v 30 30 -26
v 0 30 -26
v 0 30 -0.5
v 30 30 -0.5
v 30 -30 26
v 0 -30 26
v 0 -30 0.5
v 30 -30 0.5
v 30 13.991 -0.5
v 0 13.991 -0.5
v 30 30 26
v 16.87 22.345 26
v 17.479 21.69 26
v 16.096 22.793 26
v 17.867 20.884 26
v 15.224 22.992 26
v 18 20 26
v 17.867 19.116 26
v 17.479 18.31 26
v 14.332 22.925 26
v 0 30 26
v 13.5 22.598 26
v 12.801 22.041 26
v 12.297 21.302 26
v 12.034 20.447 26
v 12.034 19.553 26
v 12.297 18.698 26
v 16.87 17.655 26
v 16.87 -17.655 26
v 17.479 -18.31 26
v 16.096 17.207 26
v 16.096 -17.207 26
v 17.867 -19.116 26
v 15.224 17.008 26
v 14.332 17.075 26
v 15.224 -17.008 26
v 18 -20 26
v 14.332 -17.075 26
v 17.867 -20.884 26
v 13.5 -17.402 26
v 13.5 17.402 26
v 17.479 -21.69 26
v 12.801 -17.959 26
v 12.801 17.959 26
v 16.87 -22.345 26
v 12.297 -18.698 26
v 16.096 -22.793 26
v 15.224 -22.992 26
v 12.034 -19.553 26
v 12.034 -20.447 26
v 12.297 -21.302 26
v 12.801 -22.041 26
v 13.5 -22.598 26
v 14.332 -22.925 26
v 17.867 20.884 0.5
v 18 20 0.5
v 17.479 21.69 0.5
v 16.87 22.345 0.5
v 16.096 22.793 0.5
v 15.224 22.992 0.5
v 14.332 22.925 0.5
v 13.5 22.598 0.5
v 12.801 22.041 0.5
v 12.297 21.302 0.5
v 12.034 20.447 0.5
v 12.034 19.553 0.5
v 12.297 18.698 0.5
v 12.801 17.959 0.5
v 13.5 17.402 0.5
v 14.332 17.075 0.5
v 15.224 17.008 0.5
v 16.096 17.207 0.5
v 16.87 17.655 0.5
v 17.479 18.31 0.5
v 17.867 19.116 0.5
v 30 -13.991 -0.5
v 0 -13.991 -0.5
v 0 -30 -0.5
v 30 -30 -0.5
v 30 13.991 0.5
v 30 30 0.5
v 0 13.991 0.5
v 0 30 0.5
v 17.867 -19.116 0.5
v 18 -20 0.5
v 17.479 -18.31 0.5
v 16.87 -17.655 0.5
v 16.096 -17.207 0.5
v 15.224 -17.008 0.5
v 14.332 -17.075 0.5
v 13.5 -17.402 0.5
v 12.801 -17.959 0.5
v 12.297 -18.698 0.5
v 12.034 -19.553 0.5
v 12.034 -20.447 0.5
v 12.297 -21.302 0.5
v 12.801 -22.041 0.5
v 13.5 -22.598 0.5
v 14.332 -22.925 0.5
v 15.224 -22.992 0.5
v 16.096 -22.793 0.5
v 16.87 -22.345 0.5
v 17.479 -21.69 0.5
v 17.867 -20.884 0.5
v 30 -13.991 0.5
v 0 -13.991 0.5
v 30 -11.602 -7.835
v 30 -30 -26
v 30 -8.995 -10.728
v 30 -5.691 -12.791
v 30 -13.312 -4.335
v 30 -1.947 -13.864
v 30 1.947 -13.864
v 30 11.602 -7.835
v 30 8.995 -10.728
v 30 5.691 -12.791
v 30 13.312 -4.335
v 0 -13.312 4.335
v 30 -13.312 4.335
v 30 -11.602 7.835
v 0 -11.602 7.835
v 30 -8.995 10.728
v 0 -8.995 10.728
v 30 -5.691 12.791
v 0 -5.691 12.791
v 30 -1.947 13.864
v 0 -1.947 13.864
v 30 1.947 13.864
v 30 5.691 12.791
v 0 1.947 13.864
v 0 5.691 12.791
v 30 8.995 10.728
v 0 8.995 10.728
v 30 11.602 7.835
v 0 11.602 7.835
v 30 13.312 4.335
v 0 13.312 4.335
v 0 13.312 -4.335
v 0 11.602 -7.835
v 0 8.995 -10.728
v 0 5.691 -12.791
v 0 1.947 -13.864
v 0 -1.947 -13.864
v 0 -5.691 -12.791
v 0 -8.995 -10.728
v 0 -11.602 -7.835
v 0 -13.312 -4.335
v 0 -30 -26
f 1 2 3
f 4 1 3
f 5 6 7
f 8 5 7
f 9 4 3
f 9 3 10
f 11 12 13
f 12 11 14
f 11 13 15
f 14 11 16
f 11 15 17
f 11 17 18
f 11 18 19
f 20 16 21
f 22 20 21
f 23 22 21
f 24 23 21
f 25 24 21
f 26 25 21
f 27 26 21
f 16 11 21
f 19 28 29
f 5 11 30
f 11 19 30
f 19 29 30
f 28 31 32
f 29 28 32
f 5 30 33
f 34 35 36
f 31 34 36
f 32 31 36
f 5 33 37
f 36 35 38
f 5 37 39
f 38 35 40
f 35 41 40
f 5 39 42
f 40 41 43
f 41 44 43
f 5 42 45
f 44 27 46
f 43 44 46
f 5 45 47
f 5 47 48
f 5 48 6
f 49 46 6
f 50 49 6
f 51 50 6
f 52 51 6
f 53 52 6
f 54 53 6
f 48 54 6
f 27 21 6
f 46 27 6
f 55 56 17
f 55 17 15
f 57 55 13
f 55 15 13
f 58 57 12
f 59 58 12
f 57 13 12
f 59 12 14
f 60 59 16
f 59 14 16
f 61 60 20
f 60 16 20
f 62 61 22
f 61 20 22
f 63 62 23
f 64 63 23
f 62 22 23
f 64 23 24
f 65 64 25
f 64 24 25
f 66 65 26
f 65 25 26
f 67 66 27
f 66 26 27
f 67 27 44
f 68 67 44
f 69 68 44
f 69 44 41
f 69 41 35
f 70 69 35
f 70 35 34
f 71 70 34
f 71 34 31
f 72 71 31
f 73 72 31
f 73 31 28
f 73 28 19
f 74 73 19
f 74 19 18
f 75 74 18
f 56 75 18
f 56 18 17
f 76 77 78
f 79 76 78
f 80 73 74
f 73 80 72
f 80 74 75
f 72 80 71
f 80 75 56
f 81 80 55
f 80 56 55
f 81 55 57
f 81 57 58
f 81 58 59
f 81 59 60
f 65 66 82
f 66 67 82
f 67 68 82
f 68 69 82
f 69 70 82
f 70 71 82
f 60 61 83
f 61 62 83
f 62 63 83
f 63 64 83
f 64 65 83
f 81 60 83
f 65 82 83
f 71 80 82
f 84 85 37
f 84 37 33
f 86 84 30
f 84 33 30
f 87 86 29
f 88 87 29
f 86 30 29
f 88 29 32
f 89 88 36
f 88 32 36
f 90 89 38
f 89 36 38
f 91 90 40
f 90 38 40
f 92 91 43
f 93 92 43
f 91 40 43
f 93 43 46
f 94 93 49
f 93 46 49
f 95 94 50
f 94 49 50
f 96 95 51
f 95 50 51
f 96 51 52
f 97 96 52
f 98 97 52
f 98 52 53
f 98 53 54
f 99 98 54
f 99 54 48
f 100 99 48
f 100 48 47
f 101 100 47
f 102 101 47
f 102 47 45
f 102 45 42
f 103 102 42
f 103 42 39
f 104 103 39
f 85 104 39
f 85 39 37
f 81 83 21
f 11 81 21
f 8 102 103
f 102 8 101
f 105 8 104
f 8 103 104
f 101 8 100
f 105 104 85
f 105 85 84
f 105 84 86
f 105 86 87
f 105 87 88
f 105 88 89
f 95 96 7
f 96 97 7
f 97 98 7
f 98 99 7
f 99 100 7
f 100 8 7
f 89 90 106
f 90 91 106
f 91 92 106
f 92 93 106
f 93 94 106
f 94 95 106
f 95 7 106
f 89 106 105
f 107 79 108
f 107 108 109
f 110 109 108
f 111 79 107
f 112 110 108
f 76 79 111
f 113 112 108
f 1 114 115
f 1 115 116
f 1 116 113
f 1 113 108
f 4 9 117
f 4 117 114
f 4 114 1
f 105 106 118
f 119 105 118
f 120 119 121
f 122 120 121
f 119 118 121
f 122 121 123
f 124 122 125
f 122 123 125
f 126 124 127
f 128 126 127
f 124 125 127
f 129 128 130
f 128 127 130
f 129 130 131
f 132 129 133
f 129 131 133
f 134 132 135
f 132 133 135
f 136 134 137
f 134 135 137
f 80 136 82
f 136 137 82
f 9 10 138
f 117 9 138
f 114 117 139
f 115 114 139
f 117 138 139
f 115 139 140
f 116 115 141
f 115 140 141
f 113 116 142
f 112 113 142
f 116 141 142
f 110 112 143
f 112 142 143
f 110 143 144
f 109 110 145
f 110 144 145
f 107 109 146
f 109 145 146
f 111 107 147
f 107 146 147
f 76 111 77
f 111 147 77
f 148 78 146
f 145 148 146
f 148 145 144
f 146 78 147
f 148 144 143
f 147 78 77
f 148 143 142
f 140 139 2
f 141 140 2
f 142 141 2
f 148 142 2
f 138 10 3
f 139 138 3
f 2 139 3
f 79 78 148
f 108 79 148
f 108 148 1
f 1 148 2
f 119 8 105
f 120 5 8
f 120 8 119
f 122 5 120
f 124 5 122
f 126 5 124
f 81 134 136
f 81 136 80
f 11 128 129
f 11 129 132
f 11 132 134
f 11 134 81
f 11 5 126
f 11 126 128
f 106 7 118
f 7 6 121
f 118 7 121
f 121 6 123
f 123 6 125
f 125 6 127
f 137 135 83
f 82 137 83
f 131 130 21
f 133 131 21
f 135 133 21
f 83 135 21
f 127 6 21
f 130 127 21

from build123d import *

# Parameters (mm, degrees)
F1_DEPTH = 30
F2_R     = 3
F3_DEPTH = 52


with BuildPart() as f1:
    # F0 (on Right) → F1 (new body)
    with BuildSketch(Plane.YZ):
        with BuildLine():
            Line((-30, -26), (30, -26))
            Line((30, -26), (30, -0.5))
            Line((30, -0.5), (13.9910685796, -0.5))
            ThreePointArc((13.9910685796, -0.5), (0, -14), (-13.9910685796, -0.5))
            Line((-13.9910685796, -0.5), (-30, -0.5))
            Line((-30, -0.5), (-30, -26))
        make_face()
    extrude(amount=F1_DEPTH)


with BuildPart() as f1b:
    # F0 (on Right) → F1, piece 2 (new body)
    with BuildSketch(Plane.YZ):
        with BuildLine():
            Line((30, 0.5), (30, 26))
            Line((30, 26), (-30, 26))
            Line((-30, 26), (-30, 0.5))
            Line((-30, 0.5), (-13.9910685796, 0.5))
            ThreePointArc((-13.9910685796, 0.5), (0, 14), (13.9910685796, 0.5))
            Line((13.9910685796, 0.5), (30, 0.5))
        make_face()
    extrude(amount=F1_DEPTH)

    # F2 (on face) → F3 (cut)
    with BuildSketch(Plane.XY.offset(26)):
        with Locations((15, 20)):
            Circle(F2_R)
        with Locations((15, -20)):
            Circle(F2_R)
    extrude(amount=-F3_DEPTH, mode=Mode.SUBTRACT)


solid = Compound([f1.part, f1b.part])
